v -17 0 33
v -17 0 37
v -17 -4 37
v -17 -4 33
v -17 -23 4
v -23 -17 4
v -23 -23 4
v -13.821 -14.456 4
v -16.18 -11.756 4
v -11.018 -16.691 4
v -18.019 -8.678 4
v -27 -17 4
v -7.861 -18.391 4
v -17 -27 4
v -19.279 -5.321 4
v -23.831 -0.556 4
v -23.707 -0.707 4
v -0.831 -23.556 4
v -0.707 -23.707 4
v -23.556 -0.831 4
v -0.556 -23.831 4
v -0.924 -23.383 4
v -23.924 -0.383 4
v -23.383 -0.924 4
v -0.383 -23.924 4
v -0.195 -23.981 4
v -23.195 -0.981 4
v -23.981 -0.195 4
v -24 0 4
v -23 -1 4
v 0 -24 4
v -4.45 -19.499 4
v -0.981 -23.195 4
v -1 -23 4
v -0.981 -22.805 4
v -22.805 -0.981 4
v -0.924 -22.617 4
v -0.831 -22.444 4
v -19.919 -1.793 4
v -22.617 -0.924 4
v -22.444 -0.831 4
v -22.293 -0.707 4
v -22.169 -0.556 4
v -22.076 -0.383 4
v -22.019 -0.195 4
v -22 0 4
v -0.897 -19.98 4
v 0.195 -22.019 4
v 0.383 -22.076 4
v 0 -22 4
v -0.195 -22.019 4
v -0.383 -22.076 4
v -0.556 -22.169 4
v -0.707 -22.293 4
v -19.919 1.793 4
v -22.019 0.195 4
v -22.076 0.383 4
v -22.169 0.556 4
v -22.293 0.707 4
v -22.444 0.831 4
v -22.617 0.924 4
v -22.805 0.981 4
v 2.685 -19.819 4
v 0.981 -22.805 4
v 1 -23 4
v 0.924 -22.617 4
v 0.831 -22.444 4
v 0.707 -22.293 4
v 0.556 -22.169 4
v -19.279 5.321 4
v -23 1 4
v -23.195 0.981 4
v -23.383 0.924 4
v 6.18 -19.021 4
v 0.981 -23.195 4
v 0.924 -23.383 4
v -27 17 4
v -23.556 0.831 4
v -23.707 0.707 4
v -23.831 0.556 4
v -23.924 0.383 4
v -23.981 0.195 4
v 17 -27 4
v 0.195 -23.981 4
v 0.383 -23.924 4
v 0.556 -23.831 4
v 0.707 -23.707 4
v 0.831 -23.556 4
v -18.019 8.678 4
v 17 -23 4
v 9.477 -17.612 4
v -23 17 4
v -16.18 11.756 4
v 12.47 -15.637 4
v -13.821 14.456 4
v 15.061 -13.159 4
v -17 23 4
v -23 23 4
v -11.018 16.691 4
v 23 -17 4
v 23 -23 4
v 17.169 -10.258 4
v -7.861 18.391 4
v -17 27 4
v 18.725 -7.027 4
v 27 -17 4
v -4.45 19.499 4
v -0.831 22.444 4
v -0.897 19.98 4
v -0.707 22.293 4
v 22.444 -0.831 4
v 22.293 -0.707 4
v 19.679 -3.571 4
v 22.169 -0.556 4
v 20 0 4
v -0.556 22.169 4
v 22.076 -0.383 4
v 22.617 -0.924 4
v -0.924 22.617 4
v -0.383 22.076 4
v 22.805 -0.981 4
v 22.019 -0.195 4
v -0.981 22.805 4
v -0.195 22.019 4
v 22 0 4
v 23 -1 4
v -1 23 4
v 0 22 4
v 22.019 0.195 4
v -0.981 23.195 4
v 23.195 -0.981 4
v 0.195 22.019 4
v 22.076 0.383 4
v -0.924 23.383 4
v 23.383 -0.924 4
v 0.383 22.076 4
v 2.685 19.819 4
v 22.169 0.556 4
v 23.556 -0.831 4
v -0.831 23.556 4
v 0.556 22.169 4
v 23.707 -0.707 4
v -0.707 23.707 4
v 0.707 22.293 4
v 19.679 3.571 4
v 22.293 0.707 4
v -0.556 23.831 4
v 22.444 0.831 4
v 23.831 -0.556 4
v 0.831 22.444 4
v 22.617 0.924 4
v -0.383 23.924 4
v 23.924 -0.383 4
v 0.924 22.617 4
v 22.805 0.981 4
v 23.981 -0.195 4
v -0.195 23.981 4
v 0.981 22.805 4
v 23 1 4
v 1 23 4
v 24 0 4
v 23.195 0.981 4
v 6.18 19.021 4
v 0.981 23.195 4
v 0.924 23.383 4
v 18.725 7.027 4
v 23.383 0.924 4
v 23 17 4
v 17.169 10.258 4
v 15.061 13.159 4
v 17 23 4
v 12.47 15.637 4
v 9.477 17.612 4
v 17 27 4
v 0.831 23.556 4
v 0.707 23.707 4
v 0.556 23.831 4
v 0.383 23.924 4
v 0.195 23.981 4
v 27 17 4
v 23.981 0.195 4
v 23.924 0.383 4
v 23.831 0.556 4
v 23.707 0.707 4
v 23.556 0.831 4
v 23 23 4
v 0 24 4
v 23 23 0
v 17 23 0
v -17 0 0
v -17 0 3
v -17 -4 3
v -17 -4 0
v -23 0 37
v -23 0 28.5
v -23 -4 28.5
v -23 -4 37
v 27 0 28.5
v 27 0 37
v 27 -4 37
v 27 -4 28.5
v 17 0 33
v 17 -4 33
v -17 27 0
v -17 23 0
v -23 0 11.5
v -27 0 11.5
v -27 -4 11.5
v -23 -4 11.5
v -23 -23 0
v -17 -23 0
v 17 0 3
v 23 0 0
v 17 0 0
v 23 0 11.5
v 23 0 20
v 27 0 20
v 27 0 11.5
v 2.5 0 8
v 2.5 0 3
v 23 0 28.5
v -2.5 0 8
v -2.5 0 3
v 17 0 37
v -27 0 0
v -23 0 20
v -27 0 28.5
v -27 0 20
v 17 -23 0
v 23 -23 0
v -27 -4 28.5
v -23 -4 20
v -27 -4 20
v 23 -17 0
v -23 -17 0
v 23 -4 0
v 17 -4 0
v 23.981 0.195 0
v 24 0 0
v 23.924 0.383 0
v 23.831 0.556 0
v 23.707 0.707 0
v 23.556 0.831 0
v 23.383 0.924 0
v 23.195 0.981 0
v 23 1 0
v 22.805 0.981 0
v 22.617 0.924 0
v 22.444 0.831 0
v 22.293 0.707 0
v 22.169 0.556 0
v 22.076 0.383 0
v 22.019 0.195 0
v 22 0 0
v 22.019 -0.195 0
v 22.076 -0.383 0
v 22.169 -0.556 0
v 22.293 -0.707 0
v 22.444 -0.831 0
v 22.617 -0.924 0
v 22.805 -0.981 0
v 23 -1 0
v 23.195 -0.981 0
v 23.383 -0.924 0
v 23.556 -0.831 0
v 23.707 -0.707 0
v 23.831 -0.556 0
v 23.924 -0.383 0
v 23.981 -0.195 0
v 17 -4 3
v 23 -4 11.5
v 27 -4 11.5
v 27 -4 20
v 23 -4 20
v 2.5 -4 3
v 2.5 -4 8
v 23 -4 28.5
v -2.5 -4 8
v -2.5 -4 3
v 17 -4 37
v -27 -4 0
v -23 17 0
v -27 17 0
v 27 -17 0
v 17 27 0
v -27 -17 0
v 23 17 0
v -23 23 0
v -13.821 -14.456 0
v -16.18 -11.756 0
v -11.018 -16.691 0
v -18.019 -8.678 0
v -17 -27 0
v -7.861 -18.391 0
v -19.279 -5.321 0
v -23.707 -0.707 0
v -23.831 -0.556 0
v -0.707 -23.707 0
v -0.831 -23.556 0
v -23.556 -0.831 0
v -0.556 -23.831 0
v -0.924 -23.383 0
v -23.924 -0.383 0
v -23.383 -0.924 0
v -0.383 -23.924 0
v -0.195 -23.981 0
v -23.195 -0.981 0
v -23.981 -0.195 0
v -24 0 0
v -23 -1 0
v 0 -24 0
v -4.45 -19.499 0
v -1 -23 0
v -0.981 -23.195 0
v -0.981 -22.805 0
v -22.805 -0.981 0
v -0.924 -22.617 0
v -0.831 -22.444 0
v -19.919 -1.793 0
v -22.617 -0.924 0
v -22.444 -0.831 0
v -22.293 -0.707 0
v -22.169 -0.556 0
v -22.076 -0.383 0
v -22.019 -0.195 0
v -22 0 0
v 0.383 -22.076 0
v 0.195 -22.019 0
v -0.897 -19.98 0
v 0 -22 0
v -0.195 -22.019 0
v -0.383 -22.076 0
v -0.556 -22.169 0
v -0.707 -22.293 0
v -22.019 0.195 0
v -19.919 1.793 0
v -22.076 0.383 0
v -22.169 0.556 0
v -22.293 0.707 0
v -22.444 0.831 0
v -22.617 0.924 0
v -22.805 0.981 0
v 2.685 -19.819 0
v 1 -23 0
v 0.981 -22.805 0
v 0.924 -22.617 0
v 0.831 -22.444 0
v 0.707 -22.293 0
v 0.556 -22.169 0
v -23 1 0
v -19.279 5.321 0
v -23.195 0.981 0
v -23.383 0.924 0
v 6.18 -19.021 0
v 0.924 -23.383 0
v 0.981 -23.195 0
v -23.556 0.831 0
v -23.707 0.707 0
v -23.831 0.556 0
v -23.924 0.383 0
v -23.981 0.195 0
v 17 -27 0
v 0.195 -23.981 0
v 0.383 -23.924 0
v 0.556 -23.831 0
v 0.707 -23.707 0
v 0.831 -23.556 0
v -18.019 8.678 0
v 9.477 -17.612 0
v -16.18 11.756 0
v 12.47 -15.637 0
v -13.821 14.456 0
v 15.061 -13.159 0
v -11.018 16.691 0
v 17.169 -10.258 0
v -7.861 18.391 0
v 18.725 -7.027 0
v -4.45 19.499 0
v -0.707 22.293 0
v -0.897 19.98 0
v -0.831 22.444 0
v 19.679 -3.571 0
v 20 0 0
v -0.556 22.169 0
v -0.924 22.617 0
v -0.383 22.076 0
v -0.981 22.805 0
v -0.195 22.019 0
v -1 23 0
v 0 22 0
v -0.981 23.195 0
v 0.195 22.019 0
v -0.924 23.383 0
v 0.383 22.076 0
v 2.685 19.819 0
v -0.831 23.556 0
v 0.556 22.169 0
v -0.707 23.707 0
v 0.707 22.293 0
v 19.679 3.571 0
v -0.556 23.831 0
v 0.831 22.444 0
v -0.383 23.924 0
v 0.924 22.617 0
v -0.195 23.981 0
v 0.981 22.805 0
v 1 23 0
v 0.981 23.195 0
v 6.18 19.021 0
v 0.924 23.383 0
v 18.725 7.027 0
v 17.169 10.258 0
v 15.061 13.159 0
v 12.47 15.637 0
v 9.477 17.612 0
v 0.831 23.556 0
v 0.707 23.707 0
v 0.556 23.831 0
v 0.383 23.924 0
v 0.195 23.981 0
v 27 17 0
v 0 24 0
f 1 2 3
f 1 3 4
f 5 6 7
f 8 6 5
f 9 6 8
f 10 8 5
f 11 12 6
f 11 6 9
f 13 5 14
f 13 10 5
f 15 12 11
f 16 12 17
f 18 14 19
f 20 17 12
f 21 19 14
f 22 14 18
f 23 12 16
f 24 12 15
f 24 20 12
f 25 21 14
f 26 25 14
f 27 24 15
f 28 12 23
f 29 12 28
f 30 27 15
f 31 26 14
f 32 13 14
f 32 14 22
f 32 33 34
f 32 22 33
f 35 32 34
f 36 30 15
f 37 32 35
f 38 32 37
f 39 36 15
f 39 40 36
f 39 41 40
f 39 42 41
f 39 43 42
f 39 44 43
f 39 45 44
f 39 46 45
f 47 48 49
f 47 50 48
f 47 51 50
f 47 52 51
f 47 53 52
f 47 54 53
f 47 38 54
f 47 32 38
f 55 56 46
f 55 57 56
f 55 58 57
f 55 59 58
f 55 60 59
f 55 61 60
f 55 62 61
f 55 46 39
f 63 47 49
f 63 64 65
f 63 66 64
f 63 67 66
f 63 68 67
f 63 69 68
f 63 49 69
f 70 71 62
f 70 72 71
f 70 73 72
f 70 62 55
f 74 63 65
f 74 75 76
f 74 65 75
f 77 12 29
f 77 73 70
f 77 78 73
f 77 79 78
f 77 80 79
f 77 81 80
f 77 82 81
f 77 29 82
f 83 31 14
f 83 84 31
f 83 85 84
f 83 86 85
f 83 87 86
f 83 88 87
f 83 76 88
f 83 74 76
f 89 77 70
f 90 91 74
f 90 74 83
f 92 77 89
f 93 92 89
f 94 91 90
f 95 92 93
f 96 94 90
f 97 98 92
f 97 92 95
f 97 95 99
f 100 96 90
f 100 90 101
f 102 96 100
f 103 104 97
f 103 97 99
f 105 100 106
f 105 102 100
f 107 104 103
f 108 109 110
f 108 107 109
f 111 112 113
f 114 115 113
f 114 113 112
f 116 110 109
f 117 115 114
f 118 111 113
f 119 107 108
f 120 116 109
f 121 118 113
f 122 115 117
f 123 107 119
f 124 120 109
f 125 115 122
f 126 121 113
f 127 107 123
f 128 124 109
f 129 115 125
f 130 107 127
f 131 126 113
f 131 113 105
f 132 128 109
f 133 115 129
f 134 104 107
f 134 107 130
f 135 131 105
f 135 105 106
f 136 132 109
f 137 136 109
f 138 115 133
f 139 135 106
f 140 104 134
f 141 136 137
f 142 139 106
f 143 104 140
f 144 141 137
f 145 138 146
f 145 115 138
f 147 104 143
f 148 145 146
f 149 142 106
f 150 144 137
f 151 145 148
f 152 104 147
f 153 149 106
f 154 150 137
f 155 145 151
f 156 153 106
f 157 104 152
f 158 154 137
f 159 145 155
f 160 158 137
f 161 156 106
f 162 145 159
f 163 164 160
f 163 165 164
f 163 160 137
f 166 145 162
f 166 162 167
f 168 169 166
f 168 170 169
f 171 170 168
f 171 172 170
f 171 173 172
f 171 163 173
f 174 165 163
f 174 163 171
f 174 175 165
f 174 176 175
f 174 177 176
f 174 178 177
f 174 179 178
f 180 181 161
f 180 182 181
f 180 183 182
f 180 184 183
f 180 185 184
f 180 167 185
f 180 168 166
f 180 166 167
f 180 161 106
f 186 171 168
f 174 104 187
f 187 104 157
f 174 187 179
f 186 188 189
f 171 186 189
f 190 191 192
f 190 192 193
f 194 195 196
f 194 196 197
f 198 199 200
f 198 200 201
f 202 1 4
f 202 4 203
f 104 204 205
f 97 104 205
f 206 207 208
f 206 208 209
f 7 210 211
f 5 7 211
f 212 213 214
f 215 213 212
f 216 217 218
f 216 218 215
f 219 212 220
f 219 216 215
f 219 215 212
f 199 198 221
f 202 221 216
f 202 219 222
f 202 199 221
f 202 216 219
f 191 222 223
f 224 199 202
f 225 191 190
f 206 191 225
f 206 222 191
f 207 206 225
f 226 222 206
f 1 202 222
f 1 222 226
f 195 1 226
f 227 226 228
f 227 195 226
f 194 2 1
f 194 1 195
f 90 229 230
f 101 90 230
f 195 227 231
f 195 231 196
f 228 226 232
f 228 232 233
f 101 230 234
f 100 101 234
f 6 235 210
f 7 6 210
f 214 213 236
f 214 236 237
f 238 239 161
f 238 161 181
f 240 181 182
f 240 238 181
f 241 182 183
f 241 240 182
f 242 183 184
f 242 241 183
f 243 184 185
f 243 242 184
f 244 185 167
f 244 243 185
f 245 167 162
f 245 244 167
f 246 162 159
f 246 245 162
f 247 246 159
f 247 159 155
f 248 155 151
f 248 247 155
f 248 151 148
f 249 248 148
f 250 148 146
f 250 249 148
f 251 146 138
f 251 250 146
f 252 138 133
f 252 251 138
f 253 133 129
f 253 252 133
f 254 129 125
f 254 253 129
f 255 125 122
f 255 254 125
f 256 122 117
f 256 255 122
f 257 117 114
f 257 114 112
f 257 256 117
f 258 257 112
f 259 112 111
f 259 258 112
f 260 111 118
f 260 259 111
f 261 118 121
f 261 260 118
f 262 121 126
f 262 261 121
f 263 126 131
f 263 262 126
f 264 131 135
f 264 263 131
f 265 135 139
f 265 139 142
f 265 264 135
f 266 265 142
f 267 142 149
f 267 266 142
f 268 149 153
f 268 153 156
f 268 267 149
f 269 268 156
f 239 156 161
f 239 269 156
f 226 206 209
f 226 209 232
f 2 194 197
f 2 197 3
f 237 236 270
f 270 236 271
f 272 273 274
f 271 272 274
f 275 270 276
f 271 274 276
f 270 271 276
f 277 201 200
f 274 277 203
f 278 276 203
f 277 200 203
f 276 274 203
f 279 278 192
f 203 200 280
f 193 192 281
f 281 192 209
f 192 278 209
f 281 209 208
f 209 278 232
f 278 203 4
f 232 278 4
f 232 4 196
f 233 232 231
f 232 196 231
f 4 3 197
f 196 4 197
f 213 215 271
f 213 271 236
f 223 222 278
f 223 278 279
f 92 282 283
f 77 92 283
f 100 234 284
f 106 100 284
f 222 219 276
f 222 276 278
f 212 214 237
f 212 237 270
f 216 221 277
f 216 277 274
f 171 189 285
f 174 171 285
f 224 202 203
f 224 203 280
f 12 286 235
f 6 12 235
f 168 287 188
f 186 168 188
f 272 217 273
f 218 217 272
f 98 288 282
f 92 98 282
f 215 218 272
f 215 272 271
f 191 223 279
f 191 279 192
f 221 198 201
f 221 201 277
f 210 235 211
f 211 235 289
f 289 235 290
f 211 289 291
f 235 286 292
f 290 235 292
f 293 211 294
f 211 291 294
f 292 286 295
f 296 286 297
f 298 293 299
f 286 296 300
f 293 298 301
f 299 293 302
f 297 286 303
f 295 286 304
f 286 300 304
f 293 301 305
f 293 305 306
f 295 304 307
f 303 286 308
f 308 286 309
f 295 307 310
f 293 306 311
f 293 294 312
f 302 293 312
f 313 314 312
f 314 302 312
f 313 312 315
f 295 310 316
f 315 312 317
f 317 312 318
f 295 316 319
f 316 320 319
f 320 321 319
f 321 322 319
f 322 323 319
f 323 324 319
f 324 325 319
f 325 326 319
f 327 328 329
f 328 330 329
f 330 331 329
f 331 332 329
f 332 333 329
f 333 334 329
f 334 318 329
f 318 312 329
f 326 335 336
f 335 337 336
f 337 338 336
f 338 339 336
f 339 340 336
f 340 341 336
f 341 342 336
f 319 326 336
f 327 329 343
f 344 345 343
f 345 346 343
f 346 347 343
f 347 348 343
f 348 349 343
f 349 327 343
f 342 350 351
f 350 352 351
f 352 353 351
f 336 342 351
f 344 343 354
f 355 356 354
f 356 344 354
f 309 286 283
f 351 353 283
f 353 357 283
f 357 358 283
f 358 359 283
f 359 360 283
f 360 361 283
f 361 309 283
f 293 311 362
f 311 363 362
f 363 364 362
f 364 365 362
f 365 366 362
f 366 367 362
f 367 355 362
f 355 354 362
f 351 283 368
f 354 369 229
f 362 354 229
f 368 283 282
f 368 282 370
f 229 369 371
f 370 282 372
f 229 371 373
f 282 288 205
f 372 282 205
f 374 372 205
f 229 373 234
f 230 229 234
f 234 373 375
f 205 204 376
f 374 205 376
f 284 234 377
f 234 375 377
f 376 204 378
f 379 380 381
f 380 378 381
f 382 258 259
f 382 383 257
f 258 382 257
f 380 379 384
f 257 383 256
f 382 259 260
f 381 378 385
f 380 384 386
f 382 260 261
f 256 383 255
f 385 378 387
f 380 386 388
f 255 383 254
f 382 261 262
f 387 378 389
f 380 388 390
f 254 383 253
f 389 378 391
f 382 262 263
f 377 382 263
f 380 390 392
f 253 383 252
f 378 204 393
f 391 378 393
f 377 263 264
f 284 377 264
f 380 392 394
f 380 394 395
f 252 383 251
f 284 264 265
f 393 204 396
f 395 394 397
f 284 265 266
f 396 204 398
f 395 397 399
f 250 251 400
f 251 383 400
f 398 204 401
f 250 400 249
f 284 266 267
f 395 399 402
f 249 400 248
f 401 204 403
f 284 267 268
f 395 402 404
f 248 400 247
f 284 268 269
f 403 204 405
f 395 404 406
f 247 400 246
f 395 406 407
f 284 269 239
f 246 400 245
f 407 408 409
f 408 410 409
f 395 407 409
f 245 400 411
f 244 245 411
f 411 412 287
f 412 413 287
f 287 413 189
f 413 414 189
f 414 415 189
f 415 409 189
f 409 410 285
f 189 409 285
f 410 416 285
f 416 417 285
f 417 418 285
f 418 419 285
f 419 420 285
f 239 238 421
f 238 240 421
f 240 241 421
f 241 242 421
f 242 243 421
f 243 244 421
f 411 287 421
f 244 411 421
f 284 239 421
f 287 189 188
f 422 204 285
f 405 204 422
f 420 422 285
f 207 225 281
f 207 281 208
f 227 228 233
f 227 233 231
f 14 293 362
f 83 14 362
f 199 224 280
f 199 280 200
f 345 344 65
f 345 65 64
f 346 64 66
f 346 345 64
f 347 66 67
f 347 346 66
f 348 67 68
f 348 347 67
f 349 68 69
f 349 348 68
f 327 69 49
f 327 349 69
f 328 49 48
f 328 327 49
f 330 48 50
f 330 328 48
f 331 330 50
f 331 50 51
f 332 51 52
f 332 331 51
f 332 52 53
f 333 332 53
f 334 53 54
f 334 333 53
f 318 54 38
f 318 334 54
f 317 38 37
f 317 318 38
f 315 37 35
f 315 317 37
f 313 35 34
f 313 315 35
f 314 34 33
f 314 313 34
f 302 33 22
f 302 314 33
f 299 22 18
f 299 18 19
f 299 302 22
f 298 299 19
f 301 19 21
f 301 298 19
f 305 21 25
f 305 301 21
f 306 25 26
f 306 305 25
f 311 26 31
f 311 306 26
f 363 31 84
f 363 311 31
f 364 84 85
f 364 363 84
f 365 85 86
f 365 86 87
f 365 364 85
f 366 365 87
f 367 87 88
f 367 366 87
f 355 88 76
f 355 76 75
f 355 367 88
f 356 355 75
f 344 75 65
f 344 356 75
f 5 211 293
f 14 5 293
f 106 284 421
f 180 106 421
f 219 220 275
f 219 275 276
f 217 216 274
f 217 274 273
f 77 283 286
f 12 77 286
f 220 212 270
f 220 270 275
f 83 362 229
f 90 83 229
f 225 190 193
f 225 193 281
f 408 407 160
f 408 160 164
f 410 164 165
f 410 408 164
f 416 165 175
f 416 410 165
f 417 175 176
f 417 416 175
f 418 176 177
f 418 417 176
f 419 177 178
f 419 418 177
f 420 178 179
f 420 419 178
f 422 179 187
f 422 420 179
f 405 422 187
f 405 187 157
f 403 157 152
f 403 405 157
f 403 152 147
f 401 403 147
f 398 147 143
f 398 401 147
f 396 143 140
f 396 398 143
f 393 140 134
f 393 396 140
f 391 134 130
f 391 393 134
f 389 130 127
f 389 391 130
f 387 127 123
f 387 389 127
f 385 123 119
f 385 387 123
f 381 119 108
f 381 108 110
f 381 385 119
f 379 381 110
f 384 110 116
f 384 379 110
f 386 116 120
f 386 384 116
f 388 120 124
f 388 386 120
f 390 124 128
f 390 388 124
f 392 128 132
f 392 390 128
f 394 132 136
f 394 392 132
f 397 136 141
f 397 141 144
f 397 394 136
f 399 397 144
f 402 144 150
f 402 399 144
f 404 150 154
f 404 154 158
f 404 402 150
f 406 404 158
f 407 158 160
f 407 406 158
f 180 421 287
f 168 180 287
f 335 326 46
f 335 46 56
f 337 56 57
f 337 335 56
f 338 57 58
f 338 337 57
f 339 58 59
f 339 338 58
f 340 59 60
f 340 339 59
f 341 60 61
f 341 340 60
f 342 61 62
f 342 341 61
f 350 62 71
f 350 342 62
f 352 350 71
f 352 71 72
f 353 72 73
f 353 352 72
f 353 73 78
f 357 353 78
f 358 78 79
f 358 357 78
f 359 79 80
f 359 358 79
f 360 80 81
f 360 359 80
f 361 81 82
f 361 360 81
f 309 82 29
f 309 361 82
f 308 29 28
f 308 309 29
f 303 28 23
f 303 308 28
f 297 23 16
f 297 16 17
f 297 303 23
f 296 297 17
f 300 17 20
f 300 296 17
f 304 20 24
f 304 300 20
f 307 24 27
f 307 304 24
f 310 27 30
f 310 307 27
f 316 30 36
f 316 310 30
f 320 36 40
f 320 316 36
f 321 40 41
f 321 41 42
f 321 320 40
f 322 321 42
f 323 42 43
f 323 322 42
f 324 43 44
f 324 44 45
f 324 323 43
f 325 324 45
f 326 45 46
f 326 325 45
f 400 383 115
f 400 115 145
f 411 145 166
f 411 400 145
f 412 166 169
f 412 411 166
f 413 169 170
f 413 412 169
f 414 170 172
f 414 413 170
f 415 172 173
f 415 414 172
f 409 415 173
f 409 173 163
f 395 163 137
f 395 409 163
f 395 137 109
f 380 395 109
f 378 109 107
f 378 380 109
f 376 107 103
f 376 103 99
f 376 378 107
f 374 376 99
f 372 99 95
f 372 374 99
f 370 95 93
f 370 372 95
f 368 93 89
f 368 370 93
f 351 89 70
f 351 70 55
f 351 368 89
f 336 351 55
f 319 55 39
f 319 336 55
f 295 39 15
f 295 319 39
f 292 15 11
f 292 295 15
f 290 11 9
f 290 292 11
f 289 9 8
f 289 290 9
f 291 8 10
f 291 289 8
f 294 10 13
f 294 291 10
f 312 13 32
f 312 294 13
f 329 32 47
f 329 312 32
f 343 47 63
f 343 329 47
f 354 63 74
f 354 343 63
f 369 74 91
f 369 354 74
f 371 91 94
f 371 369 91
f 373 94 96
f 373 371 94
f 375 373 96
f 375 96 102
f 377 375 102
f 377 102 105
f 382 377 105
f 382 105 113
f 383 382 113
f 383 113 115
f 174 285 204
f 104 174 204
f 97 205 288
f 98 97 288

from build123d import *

# Parameters (mm, degrees)
SKETCH_R     = 20
SKETCH_R_2   = 1
PAD001_DEPTH = 4
PAD_DEPTH    = 4


with BuildPart() as cover:
    # Sketch → Pad001 (new body)
    with BuildSketch(Plane.XY):
        Polygon((-27, 17), (-27, -17), (-23, -17), (-23, -23), (-17, -23), (-17, -27), (17, -27), (17, -23), (23, -23), (23, -17), (27, -17), (27, 17), (23, 17), (23, 23), (17, 23), (17, 27), (-17, 27), (-17, 23), (-23, 23), (-23, 17), align=None)
        Circle(SKETCH_R, mode=Mode.SUBTRACT)
        with Locations((0, 23)):
            Circle(SKETCH_R_2, mode=Mode.SUBTRACT)
        with Locations((23, 0)):
            Circle(SKETCH_R_2, mode=Mode.SUBTRACT)
        with Locations((-23, 0)):
            Circle(SKETCH_R_2, mode=Mode.SUBTRACT)
        with Locations((0, -23)):
            Circle(SKETCH_R_2, mode=Mode.SUBTRACT)
    extrude(amount=PAD001_DEPTH)


with BuildPart() as walls:
    # Sketch001 → Pad (new body)
    with BuildSketch(Plane.XZ):
        Polygon((-23, 37), (-17, 37), (-17, 33), (17, 33), (17, 37), (27, 37), (27, 28.5), (23, 28.5), (23, 20), (27, 20), (27, 11.5), (23, 11.5), (23, 0), (17, 0), (17, 3), (2.5, 3), (2.5, 8), (-2.5, 8), (-2.5, 3), (-17, 3), (-17, 0), (-27, 0), (-27, 11.5), (-23, 11.5), (-23, 20), (-27, 20), (-27, 28.5), (-23, 28.5), align=None)
    extrude(amount=PAD_DEPTH)


solid = Compound([cover.part, walls.part])
